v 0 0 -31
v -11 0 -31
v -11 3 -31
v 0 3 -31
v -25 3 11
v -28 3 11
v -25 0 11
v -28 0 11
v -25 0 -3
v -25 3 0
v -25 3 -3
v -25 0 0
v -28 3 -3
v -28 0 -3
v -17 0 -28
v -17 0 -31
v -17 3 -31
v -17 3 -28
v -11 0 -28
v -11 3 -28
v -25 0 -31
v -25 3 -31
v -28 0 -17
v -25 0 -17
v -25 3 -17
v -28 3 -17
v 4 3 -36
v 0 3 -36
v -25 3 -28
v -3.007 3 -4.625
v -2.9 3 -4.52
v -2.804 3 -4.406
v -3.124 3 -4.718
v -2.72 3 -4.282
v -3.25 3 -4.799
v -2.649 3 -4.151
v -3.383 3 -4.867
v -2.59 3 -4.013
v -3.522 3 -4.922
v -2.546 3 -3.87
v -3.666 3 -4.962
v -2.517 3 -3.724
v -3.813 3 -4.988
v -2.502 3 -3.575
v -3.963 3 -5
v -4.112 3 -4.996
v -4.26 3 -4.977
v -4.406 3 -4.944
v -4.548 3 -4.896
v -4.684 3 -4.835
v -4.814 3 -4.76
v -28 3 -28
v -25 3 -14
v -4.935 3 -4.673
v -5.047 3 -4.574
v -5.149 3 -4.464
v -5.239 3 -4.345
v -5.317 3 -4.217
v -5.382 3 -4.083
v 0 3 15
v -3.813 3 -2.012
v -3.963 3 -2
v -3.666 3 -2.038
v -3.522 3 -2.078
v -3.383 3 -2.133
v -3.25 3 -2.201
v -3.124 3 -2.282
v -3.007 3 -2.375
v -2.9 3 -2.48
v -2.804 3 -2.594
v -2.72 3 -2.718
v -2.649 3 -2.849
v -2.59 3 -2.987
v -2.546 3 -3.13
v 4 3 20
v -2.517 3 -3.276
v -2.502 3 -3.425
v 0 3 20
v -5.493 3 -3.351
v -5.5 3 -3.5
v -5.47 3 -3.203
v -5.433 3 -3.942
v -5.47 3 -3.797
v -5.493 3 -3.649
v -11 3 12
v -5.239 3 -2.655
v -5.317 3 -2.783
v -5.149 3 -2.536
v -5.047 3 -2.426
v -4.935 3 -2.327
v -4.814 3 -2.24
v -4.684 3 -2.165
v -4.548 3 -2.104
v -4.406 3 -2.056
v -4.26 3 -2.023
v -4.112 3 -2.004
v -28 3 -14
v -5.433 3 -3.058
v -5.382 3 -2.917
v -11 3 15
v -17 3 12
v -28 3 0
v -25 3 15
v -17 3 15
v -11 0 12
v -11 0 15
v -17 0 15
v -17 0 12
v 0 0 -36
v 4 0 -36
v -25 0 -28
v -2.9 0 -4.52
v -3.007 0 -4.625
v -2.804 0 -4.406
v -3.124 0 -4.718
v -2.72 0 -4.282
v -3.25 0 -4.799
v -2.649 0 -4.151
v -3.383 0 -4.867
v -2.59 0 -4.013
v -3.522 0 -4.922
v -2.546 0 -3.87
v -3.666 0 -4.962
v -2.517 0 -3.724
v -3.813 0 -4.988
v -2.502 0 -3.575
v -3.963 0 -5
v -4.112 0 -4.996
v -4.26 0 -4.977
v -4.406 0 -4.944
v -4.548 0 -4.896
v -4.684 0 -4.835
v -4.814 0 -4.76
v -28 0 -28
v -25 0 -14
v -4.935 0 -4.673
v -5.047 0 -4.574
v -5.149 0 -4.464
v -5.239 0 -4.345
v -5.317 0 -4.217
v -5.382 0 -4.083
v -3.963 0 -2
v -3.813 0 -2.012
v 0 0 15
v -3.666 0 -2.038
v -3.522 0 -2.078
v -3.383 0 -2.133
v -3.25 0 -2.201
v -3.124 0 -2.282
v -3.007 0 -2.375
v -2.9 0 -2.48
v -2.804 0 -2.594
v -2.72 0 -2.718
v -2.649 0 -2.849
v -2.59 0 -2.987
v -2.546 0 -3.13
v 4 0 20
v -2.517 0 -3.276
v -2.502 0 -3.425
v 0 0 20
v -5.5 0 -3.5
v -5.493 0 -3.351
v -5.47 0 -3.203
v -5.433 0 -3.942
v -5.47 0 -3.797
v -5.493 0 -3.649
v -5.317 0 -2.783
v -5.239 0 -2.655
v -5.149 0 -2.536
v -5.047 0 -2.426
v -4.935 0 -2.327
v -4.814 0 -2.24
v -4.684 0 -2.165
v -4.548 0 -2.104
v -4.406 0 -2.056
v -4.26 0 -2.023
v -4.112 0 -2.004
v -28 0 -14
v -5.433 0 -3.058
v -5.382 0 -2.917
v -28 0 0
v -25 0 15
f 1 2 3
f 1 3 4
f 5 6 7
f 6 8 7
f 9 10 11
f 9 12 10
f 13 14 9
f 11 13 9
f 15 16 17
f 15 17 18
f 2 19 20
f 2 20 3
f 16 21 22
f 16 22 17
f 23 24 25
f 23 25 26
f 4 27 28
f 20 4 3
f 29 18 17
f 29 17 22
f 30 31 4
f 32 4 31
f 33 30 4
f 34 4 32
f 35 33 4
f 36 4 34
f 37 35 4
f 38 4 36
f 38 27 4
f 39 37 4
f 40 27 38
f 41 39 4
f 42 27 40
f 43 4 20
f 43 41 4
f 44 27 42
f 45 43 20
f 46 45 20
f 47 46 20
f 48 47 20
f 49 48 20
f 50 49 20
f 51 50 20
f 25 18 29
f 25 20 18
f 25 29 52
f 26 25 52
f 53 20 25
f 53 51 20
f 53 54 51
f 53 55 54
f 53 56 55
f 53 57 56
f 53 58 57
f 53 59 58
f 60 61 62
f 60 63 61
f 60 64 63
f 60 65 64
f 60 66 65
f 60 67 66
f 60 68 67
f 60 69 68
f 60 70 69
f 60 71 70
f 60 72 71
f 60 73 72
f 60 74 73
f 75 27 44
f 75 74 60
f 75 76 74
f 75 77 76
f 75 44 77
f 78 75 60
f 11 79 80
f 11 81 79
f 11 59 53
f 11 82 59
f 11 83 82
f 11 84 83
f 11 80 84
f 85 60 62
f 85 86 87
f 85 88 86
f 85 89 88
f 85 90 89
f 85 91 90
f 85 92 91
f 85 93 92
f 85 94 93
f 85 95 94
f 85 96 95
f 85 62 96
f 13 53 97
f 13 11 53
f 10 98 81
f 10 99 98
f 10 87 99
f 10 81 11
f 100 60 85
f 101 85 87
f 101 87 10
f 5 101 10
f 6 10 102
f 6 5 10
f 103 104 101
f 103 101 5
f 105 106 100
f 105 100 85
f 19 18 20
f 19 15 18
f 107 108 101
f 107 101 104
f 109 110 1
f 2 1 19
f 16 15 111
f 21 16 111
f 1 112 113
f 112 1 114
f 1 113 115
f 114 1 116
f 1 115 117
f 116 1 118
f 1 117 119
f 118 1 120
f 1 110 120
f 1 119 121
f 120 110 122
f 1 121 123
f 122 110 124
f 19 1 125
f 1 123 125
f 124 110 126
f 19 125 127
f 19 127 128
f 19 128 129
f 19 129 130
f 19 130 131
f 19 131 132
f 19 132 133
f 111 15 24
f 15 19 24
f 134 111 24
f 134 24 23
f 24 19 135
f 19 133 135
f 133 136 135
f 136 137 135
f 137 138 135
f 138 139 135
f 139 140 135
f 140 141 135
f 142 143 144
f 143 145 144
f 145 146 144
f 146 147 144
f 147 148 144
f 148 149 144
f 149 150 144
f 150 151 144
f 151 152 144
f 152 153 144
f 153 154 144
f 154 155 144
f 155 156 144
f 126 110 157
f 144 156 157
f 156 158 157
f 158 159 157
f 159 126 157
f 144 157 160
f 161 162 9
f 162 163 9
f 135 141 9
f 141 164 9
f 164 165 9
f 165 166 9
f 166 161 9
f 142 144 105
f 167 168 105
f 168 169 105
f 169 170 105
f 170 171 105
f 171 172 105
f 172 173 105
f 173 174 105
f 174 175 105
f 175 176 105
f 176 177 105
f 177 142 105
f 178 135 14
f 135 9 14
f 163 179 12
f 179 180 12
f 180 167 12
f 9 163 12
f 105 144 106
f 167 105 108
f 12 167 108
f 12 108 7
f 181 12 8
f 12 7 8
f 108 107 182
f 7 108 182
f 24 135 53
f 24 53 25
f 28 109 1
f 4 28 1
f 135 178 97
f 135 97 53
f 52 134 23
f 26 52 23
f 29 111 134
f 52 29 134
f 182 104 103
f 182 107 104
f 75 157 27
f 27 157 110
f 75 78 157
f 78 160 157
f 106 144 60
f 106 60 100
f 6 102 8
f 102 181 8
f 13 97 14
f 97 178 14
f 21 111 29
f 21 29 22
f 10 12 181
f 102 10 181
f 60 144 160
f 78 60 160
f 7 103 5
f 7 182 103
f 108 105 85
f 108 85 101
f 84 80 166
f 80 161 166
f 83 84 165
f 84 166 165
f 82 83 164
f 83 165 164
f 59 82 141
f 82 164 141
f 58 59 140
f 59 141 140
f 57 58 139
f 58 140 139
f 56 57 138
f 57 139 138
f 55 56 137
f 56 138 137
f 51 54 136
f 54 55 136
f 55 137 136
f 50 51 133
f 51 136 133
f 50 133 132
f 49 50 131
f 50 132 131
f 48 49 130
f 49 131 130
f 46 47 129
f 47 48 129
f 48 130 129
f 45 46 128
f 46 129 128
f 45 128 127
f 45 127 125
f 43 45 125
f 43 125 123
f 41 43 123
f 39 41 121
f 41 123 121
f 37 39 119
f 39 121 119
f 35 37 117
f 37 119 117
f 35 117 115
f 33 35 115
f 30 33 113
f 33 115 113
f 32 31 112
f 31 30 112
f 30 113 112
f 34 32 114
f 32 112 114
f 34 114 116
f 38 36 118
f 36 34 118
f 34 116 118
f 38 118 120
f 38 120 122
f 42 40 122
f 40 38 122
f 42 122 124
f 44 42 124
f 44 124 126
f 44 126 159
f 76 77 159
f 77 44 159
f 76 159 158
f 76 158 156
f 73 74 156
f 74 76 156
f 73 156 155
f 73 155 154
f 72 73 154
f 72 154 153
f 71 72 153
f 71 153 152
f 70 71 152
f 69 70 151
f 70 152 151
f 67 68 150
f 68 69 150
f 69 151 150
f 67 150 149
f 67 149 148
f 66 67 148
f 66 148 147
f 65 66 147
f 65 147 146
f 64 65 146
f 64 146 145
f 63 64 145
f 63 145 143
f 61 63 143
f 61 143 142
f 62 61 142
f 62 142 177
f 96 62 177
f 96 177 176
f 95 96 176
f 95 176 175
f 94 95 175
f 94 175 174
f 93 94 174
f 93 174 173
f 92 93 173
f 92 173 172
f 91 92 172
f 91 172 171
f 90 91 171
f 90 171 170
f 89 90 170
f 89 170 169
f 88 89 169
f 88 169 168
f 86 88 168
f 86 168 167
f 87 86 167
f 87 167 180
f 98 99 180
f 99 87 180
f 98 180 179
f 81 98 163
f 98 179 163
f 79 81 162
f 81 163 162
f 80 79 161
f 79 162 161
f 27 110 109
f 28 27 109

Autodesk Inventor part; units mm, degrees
ref_plane "YZ Plane" through (0, 0, 0) normal (1, 0, 0) x (0, 1, 0)
ref_plane "XZ Plane" through (0, 0, 0) normal (0, 1, 0) x (-1, 0, 0)
ref_plane "XY Plane" through (0, 0, 0) normal (0, 0, 1) x (1, 0, 0)
sketch "草圖3" plane through (0, 0, 0) normal (0, 1, 0) x (-1, 0, 0)
  line L0 (0, 0) -> (25, 0)
  line L1 (25, 0) -> (25, -31)
  line L2 (25, -31) -> (0, -31)
  line L3 (0, -31) -> (0, 0)
  circle A0 centre (4, -3.5) radius 1.5
  line L4 (28, -3) -> (25, -3)
  line L5 (25, -3) -> (25, -28)
  line L6 (25, -28) -> (28, -28)
  line L7 (28, -28) -> (28, -3)
  line L8 (28, -14) -> (25, -14)
  line L9 (25, -14) -> (25, -17)
  line L10 (25, -17) -> (28, -17)
  line L11 (28, -17) -> (28, -14)
  line L12 (25, 0) -> (0, 0)
  line L13 (0, 0) -> (0, 15)
  line L14 (0, 15) -> (25, 15)
  line L15 (25, 15) -> (25, 0)
  line L16 (28, 11) -> (25, 11)
  line L17 (25, 11) -> (25, 0)
  line L18 (25, 0) -> (28, 0)
  line L19 (28, 0) -> (28, 11)
  line L20 (0, 15) -> (0, 20)
  line L21 (0, 20) -> (-4, 20)
  line L22 (-4, 20) -> (-4, -31)
  line L23 (-4, -31) -> (-4, -36)
  line L24 (-4, -36) -> (0, -36)
  line L25 (0, -36) -> (0, -31)
  line L26 (17, 15) -> (11, 15)
  line L27 (11, 15) -> (11, 12)
  line L28 (11, 12) -> (17, 12)
  line L29 (17, 12) -> (17, 15)
  line L30 (17, -28) -> (11, -28)
  line L31 (11, -28) -> (11, -31)
  line L32 (11, -31) -> (17, -31)
  line L33 (17, -31) -> (17, -28)
  point P0 (25, -15.5)
  point P1 (25, -15.5)
  point P2 (17, -31)
  dimension "d20" = 25
  dimension "d24" = 27.5
  dimension "d25" = 21
  dimension "d26" = 3
  dimension "d27" = 3
  dimension "d28" = 3
  dimension "d29" = 3
  dimension "d30" = 3
  dimension "d31" = 3
  dimension "d33" = 3
  dimension "d34" = 11
  dimension "d35" = 5
  dimension "d36" = 4
  dimension "d37" = 5
  dimension "d38" = 3
  dimension "d39" = 6
  dimension "d40" = 3
  dimension "d41" = 8
extrude "擠出4" add sketch "草圖3" along normal blind 3 contours L13 L14 L27 L28 L29 L15 L0 | L0 L1 L2 L33 L30 L31 L3 | L3 L25 L24 L23 L22 L21 L20 L13 | L15 L16 L19 L18 | L4 L7 L8 L1 | L10 L7 L6 L1
properties material "MDF Medium Density Fiberboard"
